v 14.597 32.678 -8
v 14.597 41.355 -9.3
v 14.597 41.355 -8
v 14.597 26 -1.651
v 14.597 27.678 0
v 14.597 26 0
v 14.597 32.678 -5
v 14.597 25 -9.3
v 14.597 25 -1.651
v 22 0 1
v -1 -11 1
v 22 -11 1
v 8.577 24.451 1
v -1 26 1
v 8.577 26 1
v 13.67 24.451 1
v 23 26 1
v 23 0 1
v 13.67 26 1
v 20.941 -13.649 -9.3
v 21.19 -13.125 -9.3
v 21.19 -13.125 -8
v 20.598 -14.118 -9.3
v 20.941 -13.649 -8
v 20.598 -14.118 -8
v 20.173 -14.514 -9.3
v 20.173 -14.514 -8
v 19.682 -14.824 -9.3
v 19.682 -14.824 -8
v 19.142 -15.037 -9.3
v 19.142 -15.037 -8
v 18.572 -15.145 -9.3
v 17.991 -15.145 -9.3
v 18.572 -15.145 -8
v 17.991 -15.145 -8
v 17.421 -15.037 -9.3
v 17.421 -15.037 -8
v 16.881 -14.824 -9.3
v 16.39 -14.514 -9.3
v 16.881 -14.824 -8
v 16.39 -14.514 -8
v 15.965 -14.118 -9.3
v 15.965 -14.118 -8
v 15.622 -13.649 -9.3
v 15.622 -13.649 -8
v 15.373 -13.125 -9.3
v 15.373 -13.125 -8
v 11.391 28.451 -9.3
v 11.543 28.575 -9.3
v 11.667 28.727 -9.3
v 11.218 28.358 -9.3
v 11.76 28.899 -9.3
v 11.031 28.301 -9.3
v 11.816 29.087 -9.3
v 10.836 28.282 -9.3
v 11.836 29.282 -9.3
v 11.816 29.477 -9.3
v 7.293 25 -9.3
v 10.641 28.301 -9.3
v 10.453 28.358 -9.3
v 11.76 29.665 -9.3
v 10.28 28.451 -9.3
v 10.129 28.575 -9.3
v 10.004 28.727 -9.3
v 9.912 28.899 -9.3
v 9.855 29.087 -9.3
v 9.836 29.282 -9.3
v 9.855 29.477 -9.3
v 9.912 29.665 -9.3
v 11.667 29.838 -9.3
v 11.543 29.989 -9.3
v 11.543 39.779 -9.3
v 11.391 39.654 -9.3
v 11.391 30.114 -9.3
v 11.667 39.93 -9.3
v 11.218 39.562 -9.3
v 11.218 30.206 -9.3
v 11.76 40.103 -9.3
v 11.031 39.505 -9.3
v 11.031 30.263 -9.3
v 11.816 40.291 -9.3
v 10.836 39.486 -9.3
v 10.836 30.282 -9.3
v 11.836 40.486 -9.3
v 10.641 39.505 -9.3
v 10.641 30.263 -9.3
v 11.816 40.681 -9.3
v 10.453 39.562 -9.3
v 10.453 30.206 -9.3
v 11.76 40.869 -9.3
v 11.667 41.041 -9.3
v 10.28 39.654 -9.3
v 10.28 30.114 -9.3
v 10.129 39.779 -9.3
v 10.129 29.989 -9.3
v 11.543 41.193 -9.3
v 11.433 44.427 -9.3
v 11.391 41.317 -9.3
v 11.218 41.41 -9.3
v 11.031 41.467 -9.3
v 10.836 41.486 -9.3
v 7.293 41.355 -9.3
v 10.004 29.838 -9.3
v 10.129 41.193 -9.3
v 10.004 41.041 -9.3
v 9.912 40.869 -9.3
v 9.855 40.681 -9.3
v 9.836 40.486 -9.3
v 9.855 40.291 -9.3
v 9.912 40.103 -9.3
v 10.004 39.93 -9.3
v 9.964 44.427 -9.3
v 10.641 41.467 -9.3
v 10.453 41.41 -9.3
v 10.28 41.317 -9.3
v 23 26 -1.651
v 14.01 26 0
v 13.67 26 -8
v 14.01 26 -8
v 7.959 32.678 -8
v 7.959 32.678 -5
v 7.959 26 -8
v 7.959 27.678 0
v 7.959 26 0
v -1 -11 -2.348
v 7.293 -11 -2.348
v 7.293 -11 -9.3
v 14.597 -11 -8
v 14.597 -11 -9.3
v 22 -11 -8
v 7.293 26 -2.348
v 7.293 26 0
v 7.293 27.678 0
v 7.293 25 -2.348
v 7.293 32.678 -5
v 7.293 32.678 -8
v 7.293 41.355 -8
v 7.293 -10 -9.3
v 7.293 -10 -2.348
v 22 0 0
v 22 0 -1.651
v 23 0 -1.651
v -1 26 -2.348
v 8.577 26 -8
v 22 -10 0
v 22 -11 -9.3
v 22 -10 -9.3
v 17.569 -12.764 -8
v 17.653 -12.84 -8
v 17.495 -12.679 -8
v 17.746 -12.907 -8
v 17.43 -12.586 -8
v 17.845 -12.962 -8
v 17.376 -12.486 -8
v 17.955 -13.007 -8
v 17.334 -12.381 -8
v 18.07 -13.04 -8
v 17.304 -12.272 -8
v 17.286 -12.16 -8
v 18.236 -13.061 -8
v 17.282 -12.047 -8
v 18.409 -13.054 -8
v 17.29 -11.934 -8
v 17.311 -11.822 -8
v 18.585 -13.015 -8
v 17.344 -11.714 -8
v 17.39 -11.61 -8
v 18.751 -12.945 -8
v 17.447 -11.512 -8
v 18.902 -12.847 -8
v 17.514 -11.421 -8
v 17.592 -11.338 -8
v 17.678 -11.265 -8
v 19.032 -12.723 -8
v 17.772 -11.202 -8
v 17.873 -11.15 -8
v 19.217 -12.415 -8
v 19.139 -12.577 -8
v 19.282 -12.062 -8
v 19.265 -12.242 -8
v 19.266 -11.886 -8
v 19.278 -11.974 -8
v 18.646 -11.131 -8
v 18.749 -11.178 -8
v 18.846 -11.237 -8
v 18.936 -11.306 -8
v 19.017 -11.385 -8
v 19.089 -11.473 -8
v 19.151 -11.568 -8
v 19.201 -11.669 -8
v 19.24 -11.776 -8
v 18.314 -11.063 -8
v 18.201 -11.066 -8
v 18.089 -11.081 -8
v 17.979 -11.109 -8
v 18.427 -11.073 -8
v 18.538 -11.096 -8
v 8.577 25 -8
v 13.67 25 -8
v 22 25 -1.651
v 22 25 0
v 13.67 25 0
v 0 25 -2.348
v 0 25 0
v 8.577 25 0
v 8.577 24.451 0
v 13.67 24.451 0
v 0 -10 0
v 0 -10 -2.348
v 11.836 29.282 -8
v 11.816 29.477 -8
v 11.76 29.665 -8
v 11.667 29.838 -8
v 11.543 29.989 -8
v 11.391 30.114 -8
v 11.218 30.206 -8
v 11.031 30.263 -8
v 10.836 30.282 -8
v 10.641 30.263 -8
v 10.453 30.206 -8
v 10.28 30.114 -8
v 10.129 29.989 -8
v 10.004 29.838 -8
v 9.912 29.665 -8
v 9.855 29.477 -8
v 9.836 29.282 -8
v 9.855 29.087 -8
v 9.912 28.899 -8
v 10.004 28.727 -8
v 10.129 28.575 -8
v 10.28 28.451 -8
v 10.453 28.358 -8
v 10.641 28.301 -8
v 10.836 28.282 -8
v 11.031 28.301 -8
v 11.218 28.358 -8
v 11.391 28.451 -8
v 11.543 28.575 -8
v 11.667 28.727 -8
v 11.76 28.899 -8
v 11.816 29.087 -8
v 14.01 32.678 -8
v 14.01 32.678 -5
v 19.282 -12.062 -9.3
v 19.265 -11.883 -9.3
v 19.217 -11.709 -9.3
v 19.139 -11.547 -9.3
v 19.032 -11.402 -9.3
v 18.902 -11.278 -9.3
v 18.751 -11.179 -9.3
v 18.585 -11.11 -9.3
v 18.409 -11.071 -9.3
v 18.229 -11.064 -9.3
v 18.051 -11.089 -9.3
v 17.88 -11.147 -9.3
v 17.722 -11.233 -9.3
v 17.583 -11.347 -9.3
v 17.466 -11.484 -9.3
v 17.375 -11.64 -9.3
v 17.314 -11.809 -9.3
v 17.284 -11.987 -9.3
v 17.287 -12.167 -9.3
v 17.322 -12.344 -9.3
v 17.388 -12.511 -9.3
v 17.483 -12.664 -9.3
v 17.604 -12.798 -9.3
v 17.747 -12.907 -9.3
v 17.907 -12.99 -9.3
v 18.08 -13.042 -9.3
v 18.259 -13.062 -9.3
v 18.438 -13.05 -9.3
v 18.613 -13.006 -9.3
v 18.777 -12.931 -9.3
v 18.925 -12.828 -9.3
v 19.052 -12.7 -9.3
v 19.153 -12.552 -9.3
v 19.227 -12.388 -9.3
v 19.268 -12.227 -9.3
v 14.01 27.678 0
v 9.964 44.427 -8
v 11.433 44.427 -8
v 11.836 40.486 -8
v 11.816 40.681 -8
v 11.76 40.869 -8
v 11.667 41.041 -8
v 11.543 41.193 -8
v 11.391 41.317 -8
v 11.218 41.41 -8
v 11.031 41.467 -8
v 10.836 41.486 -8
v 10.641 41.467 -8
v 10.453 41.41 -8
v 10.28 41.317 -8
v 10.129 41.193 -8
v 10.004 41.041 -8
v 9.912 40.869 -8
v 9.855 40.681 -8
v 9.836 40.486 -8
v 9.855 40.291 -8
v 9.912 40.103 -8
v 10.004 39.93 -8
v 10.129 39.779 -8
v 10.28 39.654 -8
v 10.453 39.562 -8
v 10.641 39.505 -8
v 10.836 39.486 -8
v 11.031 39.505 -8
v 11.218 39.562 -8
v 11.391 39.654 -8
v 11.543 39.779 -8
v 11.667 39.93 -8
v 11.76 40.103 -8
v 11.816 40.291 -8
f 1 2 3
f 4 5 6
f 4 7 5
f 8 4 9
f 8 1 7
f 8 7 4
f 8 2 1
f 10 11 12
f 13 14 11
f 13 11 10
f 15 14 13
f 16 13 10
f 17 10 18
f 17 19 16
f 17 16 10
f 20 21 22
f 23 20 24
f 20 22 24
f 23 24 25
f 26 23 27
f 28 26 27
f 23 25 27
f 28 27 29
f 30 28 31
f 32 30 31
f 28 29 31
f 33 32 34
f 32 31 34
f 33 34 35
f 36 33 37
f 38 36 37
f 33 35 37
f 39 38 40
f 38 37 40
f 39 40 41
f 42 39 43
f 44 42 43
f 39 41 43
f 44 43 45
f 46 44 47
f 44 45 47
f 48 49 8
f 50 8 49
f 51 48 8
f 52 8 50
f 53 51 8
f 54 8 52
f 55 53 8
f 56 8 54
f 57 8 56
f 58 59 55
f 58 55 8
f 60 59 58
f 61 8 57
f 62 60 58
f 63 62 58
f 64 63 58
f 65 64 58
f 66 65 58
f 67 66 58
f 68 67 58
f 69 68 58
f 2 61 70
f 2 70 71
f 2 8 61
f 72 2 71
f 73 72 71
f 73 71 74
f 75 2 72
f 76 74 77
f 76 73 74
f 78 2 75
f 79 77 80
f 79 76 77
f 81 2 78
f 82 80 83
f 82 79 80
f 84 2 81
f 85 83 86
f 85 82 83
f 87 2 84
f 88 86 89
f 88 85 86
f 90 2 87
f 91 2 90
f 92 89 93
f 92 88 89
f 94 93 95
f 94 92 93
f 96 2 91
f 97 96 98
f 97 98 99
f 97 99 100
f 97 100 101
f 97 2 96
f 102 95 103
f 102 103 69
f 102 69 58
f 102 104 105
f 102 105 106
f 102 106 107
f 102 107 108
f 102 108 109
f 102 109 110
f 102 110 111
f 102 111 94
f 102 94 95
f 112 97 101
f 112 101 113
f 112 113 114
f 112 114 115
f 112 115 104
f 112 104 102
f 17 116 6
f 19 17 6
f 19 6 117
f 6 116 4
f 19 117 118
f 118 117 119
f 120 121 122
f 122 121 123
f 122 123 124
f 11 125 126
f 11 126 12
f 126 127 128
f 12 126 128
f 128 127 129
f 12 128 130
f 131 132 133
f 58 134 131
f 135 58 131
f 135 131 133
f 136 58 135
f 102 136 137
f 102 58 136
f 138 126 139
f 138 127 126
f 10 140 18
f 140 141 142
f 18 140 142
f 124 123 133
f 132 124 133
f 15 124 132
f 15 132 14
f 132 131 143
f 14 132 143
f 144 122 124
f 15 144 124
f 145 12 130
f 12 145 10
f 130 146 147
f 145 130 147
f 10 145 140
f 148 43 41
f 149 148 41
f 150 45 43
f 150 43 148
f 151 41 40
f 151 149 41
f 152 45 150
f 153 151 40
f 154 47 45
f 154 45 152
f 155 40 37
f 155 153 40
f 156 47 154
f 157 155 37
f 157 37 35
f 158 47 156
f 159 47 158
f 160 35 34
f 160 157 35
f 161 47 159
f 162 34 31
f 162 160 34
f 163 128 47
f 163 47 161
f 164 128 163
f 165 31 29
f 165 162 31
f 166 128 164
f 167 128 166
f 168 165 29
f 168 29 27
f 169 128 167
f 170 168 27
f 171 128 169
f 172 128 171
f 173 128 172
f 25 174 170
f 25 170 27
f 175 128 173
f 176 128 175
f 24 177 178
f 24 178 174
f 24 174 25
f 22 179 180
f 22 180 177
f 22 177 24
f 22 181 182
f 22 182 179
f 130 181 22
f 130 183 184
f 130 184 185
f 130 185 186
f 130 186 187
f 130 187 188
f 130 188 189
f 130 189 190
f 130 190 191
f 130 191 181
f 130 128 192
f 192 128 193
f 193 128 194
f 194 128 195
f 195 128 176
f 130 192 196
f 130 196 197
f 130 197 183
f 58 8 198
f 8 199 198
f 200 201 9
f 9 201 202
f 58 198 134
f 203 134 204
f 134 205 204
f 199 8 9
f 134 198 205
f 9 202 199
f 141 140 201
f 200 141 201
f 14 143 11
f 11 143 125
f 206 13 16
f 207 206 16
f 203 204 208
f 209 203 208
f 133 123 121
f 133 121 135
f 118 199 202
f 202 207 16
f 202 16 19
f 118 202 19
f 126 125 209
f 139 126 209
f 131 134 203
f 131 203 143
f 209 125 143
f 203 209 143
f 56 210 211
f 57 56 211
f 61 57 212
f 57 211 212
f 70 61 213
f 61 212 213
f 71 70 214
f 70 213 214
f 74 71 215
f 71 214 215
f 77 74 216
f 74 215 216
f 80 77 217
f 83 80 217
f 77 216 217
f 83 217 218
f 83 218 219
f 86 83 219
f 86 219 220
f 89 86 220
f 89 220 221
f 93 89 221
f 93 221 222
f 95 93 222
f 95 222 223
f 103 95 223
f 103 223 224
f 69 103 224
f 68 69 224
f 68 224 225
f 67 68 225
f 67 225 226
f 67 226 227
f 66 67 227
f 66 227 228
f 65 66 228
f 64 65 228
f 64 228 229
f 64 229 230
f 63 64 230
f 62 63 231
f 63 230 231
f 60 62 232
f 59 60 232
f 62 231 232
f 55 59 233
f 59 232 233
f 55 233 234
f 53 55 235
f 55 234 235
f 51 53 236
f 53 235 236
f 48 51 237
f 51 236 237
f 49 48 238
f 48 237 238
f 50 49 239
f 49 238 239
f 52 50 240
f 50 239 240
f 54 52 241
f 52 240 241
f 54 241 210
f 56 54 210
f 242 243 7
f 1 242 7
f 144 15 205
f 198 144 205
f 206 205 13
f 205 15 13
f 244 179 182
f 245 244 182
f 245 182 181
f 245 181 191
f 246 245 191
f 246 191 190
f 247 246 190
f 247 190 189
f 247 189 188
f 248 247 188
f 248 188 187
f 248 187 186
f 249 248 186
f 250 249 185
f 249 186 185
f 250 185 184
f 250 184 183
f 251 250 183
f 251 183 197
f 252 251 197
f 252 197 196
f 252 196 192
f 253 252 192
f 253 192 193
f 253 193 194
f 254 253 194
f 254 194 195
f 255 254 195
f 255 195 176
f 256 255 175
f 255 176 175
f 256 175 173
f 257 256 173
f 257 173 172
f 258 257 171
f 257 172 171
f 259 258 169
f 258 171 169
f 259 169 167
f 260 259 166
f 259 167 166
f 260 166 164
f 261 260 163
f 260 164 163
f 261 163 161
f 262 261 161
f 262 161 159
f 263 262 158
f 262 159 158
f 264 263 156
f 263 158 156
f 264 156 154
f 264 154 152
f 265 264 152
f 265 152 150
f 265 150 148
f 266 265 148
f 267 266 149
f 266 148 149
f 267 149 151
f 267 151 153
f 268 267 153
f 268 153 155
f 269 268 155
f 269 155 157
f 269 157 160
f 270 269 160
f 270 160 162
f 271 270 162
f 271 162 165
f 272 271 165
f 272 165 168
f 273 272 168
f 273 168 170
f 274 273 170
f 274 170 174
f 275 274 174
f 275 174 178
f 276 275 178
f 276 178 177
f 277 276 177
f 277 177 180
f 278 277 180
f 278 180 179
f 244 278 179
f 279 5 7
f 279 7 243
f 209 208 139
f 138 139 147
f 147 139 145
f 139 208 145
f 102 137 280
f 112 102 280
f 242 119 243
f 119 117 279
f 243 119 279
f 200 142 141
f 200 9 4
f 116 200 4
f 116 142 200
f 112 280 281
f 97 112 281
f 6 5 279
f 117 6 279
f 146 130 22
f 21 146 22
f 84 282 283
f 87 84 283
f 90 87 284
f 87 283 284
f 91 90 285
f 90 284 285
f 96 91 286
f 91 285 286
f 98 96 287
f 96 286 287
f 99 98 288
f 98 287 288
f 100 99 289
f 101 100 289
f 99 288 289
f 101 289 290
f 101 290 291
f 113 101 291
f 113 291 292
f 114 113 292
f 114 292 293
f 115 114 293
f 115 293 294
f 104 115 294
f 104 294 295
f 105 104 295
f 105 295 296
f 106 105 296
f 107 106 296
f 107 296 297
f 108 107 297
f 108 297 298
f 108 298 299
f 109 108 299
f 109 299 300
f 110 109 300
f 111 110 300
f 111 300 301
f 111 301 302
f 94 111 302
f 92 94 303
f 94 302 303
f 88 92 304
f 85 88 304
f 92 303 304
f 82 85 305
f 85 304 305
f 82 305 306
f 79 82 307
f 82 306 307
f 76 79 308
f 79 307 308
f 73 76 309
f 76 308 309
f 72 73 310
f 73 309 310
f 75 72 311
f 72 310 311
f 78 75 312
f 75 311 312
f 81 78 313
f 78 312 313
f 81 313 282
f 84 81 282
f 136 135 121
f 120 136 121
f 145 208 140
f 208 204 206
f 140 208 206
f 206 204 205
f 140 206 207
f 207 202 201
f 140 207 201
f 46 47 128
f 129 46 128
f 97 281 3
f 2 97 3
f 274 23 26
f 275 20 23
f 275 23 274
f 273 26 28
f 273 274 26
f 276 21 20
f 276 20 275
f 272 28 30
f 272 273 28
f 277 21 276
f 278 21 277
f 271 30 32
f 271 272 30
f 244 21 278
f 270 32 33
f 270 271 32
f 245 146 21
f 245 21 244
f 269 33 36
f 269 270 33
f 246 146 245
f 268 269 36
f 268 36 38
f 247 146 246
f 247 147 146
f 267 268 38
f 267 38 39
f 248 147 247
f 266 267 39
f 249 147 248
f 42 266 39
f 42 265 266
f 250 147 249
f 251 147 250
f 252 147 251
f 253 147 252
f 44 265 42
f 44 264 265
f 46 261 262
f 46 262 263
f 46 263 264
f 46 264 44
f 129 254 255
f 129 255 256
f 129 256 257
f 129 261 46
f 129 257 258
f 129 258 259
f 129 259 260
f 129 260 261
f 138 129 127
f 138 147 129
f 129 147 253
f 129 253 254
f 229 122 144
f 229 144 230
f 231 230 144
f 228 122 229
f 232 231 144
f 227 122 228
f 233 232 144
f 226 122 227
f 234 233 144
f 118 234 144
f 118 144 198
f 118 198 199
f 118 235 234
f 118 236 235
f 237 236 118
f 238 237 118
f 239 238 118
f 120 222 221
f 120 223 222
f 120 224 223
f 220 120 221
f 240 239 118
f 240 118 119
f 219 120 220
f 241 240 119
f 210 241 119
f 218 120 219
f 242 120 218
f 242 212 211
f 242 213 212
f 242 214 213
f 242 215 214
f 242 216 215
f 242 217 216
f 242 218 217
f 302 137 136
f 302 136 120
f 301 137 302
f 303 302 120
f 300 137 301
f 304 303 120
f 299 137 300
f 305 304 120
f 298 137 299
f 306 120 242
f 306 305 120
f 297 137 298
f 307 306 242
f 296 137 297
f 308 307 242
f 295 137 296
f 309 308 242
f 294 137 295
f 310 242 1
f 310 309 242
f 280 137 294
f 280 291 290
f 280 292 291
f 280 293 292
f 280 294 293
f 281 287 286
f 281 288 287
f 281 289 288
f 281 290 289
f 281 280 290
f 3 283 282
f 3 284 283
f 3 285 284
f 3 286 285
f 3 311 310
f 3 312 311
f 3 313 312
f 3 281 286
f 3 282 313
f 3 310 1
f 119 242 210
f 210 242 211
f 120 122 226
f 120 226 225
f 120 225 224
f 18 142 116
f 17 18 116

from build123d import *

# Parameters (mm, degrees)
ESQUISSE1_R             = 1
ESQUISSE1_RX            = 1
ESQUISSE1_RY            = 0.999955708
EXTRUSION1_DEPTH        = 9.3
EXTRUSION2_DEPTH        = 1
ENL_V_MAT_EXTRU_1_REACH = 53.345
ESQUISSE3_W             = 7.649288298
ESQUISSE3_H             = 26
ENL_V_MAT_EXTRU_2_REACH = 53.345
ESQUISSE4_W             = 6.951833508
ESQUISSE4_H             = 37
ENL_V_MAT_EXTRU_3_DEPTH = 9
CHANFREIN1_SIZE         = 5
ENL_V_MAT_EXTRU_4_DEPTH = 8


with BuildPart() as part:
    # Esquisse1 → Extrusion1 (new body)
    with BuildSketch(Plane.XY):
        with BuildLine():
            Line((22, 0), (22, 25))
            Line((22, 25), (0, 25))
            Line((0, 25), (0, -10))
            Line((0, -10), (22, -10))
            Line((22, -10), (22, -11))
            Line((22, -11), (21.190138404, -13.124684482))
            ThreePointArc((21.190138404, -13.124684482), (18.28157598, -15.158841298), (15.373013556, -13.124684482))
            Line((15.373013556, -13.124684482), (14.596979988, -11))
            Line((14.596979988, -11), (-1, -11))
            Line((-1, -11), (-1, 26))
            Line((-1, 26), (7.292692784, 26))
            Line((7.292692784, 26), (7.292692784, 41.355378005))
            Line((7.292692784, 41.355378005), (9.96388584, 44.427250018))
            Line((9.96388584, 44.427250018), (11.43304202, 44.427250018))
            Line((11.43304202, 44.427250018), (14.596979988, 41.355378005))
            Line((14.596979988, 41.355378005), (14.596979988, 26))
            Line((14.596979988, 26), (23, 26))
            Line((23, 26), (23, 0))
            Line((23, 0), (22, 0))
        make_face()
        with Locations((10.835624977, 29.282154136)):
            Circle(ESQUISSE1_R, mode=Mode.SUBTRACT)
        with Locations((10.835624977, 40.485887017)):
            Circle(ESQUISSE1_R, mode=Mode.SUBTRACT)
        with Locations(Location((18.28157598, -12.062342241), (0, 0, 0))):
            Ellipse(ESQUISSE1_RX, ESQUISSE1_RY, mode=Mode.SUBTRACT)
    extrude(amount=-EXTRUSION1_DEPTH)

    # Esquisse2 → Extrusion2 (add)
    with BuildSketch(Plane.XY):
        Polygon((22, 0), (23, 0), (23, 26), (-1, 26), (-1, -11), (22, -11), align=None)
    extrude(amount=EXTRUSION2_DEPTH)

    # Enlèv. mat.-Extru.1: up to this face of the body (flat: up to its plane)
    enl_v_mat_extru_1_end = Plane(part.part.faces().sort_by_distance((14.596979988, 33.677689002, -4.65))[0])
    # Esquisse3 → Enlèv. mat.-Extru.1 (cut, up to the picked face)
    with BuildSketch(Plane(origin=(23, 0, 0), x_dir=(0, 0, -1), z_dir=(1, 0, 0)), mode=Mode.PRIVATE) as enl_v_mat_extru_1_sk1:
        with Locations((5.475355851, 13)):
            Rectangle(ESQUISSE3_W, ESQUISSE3_H)
    enl_v_mat_extru_1_tool1 = split(extrude(enl_v_mat_extru_1_sk1.sketch, amount=-ENL_V_MAT_EXTRU_1_REACH, mode=Mode.PRIVATE), bisect_by=enl_v_mat_extru_1_end, keep=Keep.BOTH, mode=Mode.PRIVATE)
    add(enl_v_mat_extru_1_tool1.solids().sort_by(Axis((23, 13, -5.475356), (-1, 0, 0)))[0], mode=Mode.SUBTRACT)

    # Enlèv. mat.-Extru.2: up to this face of the body (flat: up to its plane)
    enl_v_mat_extru_2_end = Plane(part.part.faces().sort_by_distance((7.292692784, 33.677689002, -4.65))[0])
    # Esquisse4 → Enlèv. mat.-Extru.2 (cut, up to the picked face)
    with BuildSketch(Plane.ZY.offset(1), mode=Mode.PRIVATE) as enl_v_mat_extru_2_sk1:
        with Locations((-5.824083246, 7.5)):
            Rectangle(ESQUISSE4_W, ESQUISSE4_H)
    enl_v_mat_extru_2_tool1 = split(extrude(enl_v_mat_extru_2_sk1.sketch, amount=-ENL_V_MAT_EXTRU_2_REACH, mode=Mode.PRIVATE), bisect_by=enl_v_mat_extru_2_end, keep=Keep.BOTH, mode=Mode.PRIVATE)
    add(enl_v_mat_extru_2_tool1.solids().sort_by(Axis((-1, 7.5, -5.824083), (1, 0, 0)))[0], mode=Mode.SUBTRACT)

    # Esquisse5 → Enlèv. mat.-Extru.3 (cut)
    with BuildSketch(Plane.XY.offset(1)):
        Polygon((8.576662765, 24.450773838), (13.66977831, 24.450773838), (13.66977831, 26), (14.010433901, 26), (14.010433901, 32.678482304), (15.670246393, 32.678482304), (15.670246393, 45.814943355), (7.292692784, 45.814943355), (7.292692784, 32.678482304), (7.959479115, 32.678482304), (7.959479115, 26), (8.576662765, 26), align=None)
    extrude(amount=-ENL_V_MAT_EXTRU_3_DEPTH, mode=Mode.SUBTRACT)

    # Chanfrein1
    chanfrein1_edges = [part.edges().sort_by_distance(p)[0] for p in [
        (7.62608595, 32.678482304, 0),
        (14.303706945, 32.678482304, 0),
    ]]
    chamfer(chanfrein1_edges, length=CHANFREIN1_SIZE)

    # Esquisse6 → Enlèv. mat.-Extru.4 (cut)
    with BuildSketch(Plane.XY):
        with BuildLine():
            Line((22, -11), (14.596979988, -11))
            Line((14.596979988, -11), (15.373013556, -13.124684482))
            ThreePointArc((15.373013556, -13.124684482), (18.28157598, -15.158841298), (21.190138404, -13.124684482))
            Line((21.190138404, -13.124684482), (22, -11))
        make_face()
    extrude(amount=-ENL_V_MAT_EXTRU_4_DEPTH, mode=Mode.SUBTRACT)


solid = part.part
